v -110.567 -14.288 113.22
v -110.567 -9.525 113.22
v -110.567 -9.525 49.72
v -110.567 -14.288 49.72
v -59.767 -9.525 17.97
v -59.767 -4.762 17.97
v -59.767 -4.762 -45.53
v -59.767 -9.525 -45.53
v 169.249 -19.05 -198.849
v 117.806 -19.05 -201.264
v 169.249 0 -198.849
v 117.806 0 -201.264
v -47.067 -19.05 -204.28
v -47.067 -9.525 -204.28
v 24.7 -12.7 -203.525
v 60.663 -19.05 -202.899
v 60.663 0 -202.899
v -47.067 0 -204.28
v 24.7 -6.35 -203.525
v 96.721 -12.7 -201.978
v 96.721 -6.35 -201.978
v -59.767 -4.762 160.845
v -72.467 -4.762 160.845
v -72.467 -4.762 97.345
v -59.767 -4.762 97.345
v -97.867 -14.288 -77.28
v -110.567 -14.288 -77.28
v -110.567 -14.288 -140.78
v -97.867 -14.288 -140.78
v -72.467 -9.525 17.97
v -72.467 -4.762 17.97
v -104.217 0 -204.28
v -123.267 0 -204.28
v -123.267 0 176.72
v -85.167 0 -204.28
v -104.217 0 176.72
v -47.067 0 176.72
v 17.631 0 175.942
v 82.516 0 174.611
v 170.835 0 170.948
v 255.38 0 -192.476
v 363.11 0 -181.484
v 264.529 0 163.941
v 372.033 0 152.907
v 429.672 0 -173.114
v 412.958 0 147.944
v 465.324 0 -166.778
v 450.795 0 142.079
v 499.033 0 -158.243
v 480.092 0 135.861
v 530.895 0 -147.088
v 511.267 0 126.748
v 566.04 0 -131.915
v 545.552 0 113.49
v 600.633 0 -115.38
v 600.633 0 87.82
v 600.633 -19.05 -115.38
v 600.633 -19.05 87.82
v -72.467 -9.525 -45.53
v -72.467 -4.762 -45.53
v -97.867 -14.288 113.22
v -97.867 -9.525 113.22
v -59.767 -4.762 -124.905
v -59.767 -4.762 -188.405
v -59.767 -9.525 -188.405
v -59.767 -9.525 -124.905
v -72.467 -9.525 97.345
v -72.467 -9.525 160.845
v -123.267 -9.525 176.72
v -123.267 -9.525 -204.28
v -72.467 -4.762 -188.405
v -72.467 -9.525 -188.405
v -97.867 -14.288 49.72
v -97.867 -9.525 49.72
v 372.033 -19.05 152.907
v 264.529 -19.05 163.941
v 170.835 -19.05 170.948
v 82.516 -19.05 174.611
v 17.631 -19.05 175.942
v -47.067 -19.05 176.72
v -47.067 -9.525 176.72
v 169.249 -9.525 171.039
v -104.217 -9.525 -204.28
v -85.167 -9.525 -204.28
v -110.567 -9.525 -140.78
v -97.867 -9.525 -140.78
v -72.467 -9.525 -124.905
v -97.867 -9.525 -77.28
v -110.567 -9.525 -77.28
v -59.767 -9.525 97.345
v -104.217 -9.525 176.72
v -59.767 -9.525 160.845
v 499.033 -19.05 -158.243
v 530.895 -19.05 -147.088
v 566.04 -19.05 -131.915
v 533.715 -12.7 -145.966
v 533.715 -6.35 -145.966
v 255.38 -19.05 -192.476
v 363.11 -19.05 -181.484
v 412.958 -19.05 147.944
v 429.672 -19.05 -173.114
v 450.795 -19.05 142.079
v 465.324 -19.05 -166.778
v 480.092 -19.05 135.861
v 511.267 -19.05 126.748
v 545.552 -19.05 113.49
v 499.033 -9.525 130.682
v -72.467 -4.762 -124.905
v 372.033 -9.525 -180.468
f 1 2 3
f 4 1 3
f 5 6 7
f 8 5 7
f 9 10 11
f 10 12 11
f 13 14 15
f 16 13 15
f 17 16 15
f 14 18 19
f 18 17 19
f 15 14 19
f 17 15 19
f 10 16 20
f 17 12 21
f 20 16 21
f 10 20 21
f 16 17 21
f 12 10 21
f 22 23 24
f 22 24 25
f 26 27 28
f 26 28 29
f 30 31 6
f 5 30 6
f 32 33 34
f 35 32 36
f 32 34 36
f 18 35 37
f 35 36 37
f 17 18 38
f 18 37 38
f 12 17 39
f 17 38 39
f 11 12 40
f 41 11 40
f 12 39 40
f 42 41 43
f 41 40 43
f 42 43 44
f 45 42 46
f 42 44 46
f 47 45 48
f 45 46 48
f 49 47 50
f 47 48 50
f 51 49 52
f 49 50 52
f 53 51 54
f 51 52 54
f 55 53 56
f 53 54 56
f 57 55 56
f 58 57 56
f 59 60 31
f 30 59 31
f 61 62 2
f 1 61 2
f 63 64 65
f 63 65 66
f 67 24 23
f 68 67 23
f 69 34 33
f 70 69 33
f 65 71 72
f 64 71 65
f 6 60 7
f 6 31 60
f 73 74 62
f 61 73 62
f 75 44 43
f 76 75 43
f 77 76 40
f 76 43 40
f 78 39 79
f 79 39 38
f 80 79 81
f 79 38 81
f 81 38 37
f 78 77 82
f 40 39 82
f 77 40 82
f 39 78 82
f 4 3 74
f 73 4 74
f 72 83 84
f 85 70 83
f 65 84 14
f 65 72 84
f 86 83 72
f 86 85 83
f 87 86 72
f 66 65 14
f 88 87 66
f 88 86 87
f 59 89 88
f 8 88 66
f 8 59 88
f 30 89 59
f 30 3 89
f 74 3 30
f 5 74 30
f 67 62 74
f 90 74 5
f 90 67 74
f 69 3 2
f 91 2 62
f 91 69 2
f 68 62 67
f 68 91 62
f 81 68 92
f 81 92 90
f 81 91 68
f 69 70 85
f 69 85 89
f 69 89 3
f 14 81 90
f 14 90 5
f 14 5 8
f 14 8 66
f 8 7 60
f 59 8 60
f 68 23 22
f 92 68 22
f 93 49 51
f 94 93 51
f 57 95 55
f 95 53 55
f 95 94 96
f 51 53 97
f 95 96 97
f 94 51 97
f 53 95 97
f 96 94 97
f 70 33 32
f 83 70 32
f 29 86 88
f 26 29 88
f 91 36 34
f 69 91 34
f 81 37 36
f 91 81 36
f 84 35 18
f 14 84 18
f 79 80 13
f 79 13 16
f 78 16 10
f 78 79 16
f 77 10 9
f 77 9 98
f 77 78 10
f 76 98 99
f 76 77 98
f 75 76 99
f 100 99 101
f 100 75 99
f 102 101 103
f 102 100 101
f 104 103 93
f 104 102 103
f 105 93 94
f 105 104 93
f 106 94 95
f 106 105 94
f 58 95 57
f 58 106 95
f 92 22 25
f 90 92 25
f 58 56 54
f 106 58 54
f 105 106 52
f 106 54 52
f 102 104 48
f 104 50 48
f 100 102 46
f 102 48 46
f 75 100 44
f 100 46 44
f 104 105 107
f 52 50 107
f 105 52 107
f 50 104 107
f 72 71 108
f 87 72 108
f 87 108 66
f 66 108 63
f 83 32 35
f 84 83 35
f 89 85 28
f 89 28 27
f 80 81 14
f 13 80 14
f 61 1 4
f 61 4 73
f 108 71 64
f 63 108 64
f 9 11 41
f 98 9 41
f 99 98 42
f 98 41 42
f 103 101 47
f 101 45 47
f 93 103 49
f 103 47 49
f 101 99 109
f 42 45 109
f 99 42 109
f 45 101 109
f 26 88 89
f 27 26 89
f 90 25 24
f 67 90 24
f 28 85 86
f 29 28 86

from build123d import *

# Parameters (mm, degrees)
F1_DEPTH = 19.05
F0_W     = 12.7
F0_H     = 63.5
F2_DEPTH = 9.525
F0_W_2   = 6.35
F0_H_2   = 31.75
F3_DEPTH = 4.7625
F4_DEPTH = 14.2875


# Not quite as in the source:
# - ends of sketch curves that miss each other by under 0.0002 mm in the source are joined


with BuildPart() as f1:
    # F0 (on Front) → F1 (new body)
    with BuildSketch(Plane.XZ):
        with BuildLine():
            Line((499.03344463, -13.7801575565), (499.03344463, -158.2426575565))
            add(Edge.make_bspline(
                [(499.03344463, -158.2426575565), (534.3674505865, -147.5744416568), (567.5004476082, -131.4772996066), (600.63344463, -115.3801575565)],
                knots=[0.7934300226, 0.7934300226, 0.7934300226, 0.7934300226, 1, 1, 1, 1], degree=3))
            Line((600.63344463, -115.3801575565), (600.63344463, -13.7801575565))
            Line((600.63344463, -13.7801575565), (600.63344463, 87.8198424435))
            add(Edge.make_bspline(
                [(600.63344463, 87.8198424435), (567.5002128258, 103.9114654586), (534.3669810216, 120.0030884738), (499.03344463, 130.6823424435)],
                knots=[0, 0, 0, 0, 0.2065722783, 0.2065722783, 0.2065722783, 0.2065722783], degree=3))
            Line((499.03344463, 130.6823424435), (499.03344463, -13.7801575565))
        make_face()
        with BuildLine():
            Line((169.2494543654, -13.9049269416), (169.2494543653, -198.8486769416))
            add(Edge.make_bspline(
                [(169.2494543653, -198.8486769416), (239.9344955626, -194.7900478461), (311.6955925282, -187.3813112289), (372.03344463, -180.4676575565)],
                knots=[0.2893668435, 0.2893668435, 0.2893668435, 0.2893668435, 0.5700660968, 0.5700660968, 0.5700660968, 0.5700660968], degree=3))
            Line((372.03344463, -180.4676575565), (372.03344463, -13.7801575565))
            Line((372.03344463, -13.7801575565), (372.03344463, 152.9073424435))
            add(Edge.make_bspline(
                [(372.03344463, 152.9073424435), (311.6965969023, 159.7662930053), (239.9327534215, 167.0025918958), (169.2494543654, 171.0388230584)],
                knots=[0.4299386922, 0.4299386922, 0.4299386922, 0.4299386922, 0.7106256488, 0.7106256488, 0.7106256488, 0.7106256488], degree=3))
            Line((169.2494543654, 171.0388230584), (169.2494543654, -13.9049269416))
        make_face()
        with BuildLine():
            Line((372.03344463, -13.7801575565), (372.03344463, -180.4676575565))
            add(Edge.make_bspline(
                [(372.03344463, -180.4676575565), (420.0467519851, -174.9661793441), (460.8268165983, -169.7781895634), (499.03344463, -158.2426575565)],
                knots=[0.5700660968, 0.5700660968, 0.5700660968, 0.5700660968, 0.7934300226, 0.7934300226, 0.7934300226, 0.7934300226], degree=3))
            Line((499.03344463, -158.2426575565), (499.03344463, -13.7801575565))
            Line((499.03344463, -13.7801575565), (499.03344463, 130.6823424435))
            add(Edge.make_bspline(
                [(499.03344463, 130.6823424435), (460.8273243383, 142.2298099053), (420.0485909934, 147.4490938355), (372.03344463, 152.9073424435)],
                knots=[0.2065722783, 0.2065722783, 0.2065722783, 0.2065722783, 0.4299386922, 0.4299386922, 0.4299386922, 0.4299386922], degree=3))
            Line((372.03344463, 152.9073424435), (372.03344463, -13.7801575565))
        make_face()
        with BuildLine():
            Line((-47.06655537, -13.7801514768), (-47.06655537, -204.2801485002))
            add(Edge.make_bspline(
                [(-47.06655537, -204.2801485002), (24.657602579, -203.6563895898), (96.3817605281, -203.0326306794), (169.2494543653, -198.8486769416)],
                knots=[0, 0, 0, 0, 0.2893668435, 0.2893668435, 0.2893668435, 0.2893668435], degree=3))
            Line((169.2494543653, -198.8486769416), (169.2494543654, -13.9049269416))
            Line((169.2494543654, -13.9049269416), (169.2494543654, 171.0388230584))
            add(Edge.make_bspline(
                [(169.2494543654, 171.0388230584), (96.3784736275, 175.1999774928), (24.6559591287, 175.9599115197), (-47.06655537, 176.7198455466)],
                knots=[0.7106256488, 0.7106256488, 0.7106256488, 0.7106256488, 1, 1, 1, 1], degree=3))
            Line((-47.06655537, 176.7198455466), (-47.06655537, -13.7801514768))
        make_face()
    extrude(amount=F1_DEPTH)

    # F0 (on Front) → F2 (join)
    with BuildSketch(Plane.XZ):
        Polygon((-123.26655537, 176.7198455466), (-123.26655537, -13.7801514768), (-104.21655537, -13.7801514768), (-104.21655537, 49.7198424435), (-110.56655537, 49.7198424435), (-110.56655537, 113.2198424435), (-104.21655537, 113.2198424435), (-104.21655537, 176.7198363638), align=None)
        Polygon((-104.21655537, 49.7198424435), (-104.21655537, -13.7801514768), (-85.16655537, -13.7801514768), (-85.16655537, 176.7198455466), (-104.21655537, 176.7198455466), (-104.21655537, 113.2198424435), (-97.86655537, 113.2198424435), (-97.86655537, 49.7198424435), align=None)
        Polygon((-85.16655537, 176.7198455466), (-85.16655537, -13.7801514768), (-72.46655537, -13.7801514768), (-72.46655537, 17.9698485232), (-66.11655537, 17.9698485232), (-66.11655537, 81.4698470349), (-66.11655537, 97.3448462908), (-72.46655537, 97.3448462908), (-72.46655537, 160.8448462908), (-66.11655537, 160.8448462908), (-66.11655537, 176.7198455466), align=None)
        Polygon((-47.06655537, 176.7198455466), (-66.11655537, 176.7198455466), (-66.11655537, 160.8448462908), (-59.76655537, 160.8448462908), (-59.76655537, 97.3448462908), (-66.11655537, 97.3448462908), (-66.11655537, 81.4698470349), (-66.11655537, 17.9698485232), (-59.76655537, 17.9698485232), (-59.76655537, -13.7801514768), (-47.06655537, -13.7801514768), align=None)
        Polygon((-104.21655537, -13.7801514768), (-123.26655537, -13.7801514768), (-123.26655537, -204.2801485003), (-104.21655537, -204.2801485002), (-104.21655537, -140.7801453971), (-110.56655537, -140.7801453971), (-110.56655537, -77.2801453971), (-104.21655537, -77.2801453971), align=None)
        Polygon((-85.16655537, -13.7801514768), (-104.21655537, -13.7801514768), (-104.21655537, -77.2801453971), (-97.86655537, -77.2801453971), (-97.86655537, -140.7801453971), (-104.21655537, -140.7801453971), (-104.21655537, -204.2801393175), (-85.16655537, -204.2801485002), align=None)
        Polygon((-72.46655537, -13.7801514768), (-85.16655537, -13.7801514768), (-85.16655537, -204.2801485002), (-47.06655537, -204.2801485002), (-47.06655537, -13.7801514768), (-59.76655537, -13.7801514768), (-59.76655537, -45.5301514768), (-66.11655537, -45.5301514768), (-72.46655537, -45.5301514768), align=None)
        with Locations((-66.11655537, -156.6551492444)):
            Rectangle(F0_W, F0_H, mode=Mode.SUBTRACT)
    extrude(amount=F2_DEPTH)

    # F0 (on Front) → F3 (join)
    with BuildSketch(Plane.XZ):
        with Locations((-66.11655537, -156.6551492444)):
            Rectangle(F0_W, F0_H)
        with Locations((-69.29155537, -29.6551514768)):
            Rectangle(F0_W_2, F0_H_2)
        with Locations((-62.94155537, -29.6551514768)):
            Rectangle(F0_W_2, F0_H_2)
        with Locations((-69.29155537, 2.0948485232)):
            Rectangle(F0_W_2, F0_H_2)
        with Locations((-62.94155537, 2.0948485232)):
            Rectangle(F0_W_2, F0_H_2)
        Polygon((-66.11655537, 129.0948462908), (-66.11655537, 160.8448462908), (-72.46655537, 160.8448462908), (-72.46655537, 97.3448462908), (-66.11655537, 97.3448462908), align=None)
        Polygon((-59.76655537, 160.8448462908), (-66.11655537, 160.8448462908), (-66.11655537, 129.0948462908), (-66.11655537, 97.3448462908), (-59.76655537, 97.3448462908), align=None)
    extrude(amount=F3_DEPTH)

    # F0 (on Front) → F4 (join)
    with BuildSketch(Plane.XZ):
        Polygon((-104.21655537, 81.4698424435), (-104.21655537, 49.7198424435), (-97.86655537, 49.7198424435), (-97.86655537, 113.2198424435), (-104.21655537, 113.2198424435), align=None)
        Polygon((-110.56655537, 49.7198424435), (-104.21655537, 49.7198424435), (-104.21655537, 81.4698424435), (-104.21655537, 113.2198424435), (-110.56655537, 113.2198424435), align=None)
        with Locations((-107.39155537, -109.0301453971)):
            Rectangle(F0_W_2, F0_H)
        with Locations((-101.04155537, -109.0301453971)):
            Rectangle(F0_W_2, F0_H)
    extrude(amount=F4_DEPTH)


solid = f1.part
